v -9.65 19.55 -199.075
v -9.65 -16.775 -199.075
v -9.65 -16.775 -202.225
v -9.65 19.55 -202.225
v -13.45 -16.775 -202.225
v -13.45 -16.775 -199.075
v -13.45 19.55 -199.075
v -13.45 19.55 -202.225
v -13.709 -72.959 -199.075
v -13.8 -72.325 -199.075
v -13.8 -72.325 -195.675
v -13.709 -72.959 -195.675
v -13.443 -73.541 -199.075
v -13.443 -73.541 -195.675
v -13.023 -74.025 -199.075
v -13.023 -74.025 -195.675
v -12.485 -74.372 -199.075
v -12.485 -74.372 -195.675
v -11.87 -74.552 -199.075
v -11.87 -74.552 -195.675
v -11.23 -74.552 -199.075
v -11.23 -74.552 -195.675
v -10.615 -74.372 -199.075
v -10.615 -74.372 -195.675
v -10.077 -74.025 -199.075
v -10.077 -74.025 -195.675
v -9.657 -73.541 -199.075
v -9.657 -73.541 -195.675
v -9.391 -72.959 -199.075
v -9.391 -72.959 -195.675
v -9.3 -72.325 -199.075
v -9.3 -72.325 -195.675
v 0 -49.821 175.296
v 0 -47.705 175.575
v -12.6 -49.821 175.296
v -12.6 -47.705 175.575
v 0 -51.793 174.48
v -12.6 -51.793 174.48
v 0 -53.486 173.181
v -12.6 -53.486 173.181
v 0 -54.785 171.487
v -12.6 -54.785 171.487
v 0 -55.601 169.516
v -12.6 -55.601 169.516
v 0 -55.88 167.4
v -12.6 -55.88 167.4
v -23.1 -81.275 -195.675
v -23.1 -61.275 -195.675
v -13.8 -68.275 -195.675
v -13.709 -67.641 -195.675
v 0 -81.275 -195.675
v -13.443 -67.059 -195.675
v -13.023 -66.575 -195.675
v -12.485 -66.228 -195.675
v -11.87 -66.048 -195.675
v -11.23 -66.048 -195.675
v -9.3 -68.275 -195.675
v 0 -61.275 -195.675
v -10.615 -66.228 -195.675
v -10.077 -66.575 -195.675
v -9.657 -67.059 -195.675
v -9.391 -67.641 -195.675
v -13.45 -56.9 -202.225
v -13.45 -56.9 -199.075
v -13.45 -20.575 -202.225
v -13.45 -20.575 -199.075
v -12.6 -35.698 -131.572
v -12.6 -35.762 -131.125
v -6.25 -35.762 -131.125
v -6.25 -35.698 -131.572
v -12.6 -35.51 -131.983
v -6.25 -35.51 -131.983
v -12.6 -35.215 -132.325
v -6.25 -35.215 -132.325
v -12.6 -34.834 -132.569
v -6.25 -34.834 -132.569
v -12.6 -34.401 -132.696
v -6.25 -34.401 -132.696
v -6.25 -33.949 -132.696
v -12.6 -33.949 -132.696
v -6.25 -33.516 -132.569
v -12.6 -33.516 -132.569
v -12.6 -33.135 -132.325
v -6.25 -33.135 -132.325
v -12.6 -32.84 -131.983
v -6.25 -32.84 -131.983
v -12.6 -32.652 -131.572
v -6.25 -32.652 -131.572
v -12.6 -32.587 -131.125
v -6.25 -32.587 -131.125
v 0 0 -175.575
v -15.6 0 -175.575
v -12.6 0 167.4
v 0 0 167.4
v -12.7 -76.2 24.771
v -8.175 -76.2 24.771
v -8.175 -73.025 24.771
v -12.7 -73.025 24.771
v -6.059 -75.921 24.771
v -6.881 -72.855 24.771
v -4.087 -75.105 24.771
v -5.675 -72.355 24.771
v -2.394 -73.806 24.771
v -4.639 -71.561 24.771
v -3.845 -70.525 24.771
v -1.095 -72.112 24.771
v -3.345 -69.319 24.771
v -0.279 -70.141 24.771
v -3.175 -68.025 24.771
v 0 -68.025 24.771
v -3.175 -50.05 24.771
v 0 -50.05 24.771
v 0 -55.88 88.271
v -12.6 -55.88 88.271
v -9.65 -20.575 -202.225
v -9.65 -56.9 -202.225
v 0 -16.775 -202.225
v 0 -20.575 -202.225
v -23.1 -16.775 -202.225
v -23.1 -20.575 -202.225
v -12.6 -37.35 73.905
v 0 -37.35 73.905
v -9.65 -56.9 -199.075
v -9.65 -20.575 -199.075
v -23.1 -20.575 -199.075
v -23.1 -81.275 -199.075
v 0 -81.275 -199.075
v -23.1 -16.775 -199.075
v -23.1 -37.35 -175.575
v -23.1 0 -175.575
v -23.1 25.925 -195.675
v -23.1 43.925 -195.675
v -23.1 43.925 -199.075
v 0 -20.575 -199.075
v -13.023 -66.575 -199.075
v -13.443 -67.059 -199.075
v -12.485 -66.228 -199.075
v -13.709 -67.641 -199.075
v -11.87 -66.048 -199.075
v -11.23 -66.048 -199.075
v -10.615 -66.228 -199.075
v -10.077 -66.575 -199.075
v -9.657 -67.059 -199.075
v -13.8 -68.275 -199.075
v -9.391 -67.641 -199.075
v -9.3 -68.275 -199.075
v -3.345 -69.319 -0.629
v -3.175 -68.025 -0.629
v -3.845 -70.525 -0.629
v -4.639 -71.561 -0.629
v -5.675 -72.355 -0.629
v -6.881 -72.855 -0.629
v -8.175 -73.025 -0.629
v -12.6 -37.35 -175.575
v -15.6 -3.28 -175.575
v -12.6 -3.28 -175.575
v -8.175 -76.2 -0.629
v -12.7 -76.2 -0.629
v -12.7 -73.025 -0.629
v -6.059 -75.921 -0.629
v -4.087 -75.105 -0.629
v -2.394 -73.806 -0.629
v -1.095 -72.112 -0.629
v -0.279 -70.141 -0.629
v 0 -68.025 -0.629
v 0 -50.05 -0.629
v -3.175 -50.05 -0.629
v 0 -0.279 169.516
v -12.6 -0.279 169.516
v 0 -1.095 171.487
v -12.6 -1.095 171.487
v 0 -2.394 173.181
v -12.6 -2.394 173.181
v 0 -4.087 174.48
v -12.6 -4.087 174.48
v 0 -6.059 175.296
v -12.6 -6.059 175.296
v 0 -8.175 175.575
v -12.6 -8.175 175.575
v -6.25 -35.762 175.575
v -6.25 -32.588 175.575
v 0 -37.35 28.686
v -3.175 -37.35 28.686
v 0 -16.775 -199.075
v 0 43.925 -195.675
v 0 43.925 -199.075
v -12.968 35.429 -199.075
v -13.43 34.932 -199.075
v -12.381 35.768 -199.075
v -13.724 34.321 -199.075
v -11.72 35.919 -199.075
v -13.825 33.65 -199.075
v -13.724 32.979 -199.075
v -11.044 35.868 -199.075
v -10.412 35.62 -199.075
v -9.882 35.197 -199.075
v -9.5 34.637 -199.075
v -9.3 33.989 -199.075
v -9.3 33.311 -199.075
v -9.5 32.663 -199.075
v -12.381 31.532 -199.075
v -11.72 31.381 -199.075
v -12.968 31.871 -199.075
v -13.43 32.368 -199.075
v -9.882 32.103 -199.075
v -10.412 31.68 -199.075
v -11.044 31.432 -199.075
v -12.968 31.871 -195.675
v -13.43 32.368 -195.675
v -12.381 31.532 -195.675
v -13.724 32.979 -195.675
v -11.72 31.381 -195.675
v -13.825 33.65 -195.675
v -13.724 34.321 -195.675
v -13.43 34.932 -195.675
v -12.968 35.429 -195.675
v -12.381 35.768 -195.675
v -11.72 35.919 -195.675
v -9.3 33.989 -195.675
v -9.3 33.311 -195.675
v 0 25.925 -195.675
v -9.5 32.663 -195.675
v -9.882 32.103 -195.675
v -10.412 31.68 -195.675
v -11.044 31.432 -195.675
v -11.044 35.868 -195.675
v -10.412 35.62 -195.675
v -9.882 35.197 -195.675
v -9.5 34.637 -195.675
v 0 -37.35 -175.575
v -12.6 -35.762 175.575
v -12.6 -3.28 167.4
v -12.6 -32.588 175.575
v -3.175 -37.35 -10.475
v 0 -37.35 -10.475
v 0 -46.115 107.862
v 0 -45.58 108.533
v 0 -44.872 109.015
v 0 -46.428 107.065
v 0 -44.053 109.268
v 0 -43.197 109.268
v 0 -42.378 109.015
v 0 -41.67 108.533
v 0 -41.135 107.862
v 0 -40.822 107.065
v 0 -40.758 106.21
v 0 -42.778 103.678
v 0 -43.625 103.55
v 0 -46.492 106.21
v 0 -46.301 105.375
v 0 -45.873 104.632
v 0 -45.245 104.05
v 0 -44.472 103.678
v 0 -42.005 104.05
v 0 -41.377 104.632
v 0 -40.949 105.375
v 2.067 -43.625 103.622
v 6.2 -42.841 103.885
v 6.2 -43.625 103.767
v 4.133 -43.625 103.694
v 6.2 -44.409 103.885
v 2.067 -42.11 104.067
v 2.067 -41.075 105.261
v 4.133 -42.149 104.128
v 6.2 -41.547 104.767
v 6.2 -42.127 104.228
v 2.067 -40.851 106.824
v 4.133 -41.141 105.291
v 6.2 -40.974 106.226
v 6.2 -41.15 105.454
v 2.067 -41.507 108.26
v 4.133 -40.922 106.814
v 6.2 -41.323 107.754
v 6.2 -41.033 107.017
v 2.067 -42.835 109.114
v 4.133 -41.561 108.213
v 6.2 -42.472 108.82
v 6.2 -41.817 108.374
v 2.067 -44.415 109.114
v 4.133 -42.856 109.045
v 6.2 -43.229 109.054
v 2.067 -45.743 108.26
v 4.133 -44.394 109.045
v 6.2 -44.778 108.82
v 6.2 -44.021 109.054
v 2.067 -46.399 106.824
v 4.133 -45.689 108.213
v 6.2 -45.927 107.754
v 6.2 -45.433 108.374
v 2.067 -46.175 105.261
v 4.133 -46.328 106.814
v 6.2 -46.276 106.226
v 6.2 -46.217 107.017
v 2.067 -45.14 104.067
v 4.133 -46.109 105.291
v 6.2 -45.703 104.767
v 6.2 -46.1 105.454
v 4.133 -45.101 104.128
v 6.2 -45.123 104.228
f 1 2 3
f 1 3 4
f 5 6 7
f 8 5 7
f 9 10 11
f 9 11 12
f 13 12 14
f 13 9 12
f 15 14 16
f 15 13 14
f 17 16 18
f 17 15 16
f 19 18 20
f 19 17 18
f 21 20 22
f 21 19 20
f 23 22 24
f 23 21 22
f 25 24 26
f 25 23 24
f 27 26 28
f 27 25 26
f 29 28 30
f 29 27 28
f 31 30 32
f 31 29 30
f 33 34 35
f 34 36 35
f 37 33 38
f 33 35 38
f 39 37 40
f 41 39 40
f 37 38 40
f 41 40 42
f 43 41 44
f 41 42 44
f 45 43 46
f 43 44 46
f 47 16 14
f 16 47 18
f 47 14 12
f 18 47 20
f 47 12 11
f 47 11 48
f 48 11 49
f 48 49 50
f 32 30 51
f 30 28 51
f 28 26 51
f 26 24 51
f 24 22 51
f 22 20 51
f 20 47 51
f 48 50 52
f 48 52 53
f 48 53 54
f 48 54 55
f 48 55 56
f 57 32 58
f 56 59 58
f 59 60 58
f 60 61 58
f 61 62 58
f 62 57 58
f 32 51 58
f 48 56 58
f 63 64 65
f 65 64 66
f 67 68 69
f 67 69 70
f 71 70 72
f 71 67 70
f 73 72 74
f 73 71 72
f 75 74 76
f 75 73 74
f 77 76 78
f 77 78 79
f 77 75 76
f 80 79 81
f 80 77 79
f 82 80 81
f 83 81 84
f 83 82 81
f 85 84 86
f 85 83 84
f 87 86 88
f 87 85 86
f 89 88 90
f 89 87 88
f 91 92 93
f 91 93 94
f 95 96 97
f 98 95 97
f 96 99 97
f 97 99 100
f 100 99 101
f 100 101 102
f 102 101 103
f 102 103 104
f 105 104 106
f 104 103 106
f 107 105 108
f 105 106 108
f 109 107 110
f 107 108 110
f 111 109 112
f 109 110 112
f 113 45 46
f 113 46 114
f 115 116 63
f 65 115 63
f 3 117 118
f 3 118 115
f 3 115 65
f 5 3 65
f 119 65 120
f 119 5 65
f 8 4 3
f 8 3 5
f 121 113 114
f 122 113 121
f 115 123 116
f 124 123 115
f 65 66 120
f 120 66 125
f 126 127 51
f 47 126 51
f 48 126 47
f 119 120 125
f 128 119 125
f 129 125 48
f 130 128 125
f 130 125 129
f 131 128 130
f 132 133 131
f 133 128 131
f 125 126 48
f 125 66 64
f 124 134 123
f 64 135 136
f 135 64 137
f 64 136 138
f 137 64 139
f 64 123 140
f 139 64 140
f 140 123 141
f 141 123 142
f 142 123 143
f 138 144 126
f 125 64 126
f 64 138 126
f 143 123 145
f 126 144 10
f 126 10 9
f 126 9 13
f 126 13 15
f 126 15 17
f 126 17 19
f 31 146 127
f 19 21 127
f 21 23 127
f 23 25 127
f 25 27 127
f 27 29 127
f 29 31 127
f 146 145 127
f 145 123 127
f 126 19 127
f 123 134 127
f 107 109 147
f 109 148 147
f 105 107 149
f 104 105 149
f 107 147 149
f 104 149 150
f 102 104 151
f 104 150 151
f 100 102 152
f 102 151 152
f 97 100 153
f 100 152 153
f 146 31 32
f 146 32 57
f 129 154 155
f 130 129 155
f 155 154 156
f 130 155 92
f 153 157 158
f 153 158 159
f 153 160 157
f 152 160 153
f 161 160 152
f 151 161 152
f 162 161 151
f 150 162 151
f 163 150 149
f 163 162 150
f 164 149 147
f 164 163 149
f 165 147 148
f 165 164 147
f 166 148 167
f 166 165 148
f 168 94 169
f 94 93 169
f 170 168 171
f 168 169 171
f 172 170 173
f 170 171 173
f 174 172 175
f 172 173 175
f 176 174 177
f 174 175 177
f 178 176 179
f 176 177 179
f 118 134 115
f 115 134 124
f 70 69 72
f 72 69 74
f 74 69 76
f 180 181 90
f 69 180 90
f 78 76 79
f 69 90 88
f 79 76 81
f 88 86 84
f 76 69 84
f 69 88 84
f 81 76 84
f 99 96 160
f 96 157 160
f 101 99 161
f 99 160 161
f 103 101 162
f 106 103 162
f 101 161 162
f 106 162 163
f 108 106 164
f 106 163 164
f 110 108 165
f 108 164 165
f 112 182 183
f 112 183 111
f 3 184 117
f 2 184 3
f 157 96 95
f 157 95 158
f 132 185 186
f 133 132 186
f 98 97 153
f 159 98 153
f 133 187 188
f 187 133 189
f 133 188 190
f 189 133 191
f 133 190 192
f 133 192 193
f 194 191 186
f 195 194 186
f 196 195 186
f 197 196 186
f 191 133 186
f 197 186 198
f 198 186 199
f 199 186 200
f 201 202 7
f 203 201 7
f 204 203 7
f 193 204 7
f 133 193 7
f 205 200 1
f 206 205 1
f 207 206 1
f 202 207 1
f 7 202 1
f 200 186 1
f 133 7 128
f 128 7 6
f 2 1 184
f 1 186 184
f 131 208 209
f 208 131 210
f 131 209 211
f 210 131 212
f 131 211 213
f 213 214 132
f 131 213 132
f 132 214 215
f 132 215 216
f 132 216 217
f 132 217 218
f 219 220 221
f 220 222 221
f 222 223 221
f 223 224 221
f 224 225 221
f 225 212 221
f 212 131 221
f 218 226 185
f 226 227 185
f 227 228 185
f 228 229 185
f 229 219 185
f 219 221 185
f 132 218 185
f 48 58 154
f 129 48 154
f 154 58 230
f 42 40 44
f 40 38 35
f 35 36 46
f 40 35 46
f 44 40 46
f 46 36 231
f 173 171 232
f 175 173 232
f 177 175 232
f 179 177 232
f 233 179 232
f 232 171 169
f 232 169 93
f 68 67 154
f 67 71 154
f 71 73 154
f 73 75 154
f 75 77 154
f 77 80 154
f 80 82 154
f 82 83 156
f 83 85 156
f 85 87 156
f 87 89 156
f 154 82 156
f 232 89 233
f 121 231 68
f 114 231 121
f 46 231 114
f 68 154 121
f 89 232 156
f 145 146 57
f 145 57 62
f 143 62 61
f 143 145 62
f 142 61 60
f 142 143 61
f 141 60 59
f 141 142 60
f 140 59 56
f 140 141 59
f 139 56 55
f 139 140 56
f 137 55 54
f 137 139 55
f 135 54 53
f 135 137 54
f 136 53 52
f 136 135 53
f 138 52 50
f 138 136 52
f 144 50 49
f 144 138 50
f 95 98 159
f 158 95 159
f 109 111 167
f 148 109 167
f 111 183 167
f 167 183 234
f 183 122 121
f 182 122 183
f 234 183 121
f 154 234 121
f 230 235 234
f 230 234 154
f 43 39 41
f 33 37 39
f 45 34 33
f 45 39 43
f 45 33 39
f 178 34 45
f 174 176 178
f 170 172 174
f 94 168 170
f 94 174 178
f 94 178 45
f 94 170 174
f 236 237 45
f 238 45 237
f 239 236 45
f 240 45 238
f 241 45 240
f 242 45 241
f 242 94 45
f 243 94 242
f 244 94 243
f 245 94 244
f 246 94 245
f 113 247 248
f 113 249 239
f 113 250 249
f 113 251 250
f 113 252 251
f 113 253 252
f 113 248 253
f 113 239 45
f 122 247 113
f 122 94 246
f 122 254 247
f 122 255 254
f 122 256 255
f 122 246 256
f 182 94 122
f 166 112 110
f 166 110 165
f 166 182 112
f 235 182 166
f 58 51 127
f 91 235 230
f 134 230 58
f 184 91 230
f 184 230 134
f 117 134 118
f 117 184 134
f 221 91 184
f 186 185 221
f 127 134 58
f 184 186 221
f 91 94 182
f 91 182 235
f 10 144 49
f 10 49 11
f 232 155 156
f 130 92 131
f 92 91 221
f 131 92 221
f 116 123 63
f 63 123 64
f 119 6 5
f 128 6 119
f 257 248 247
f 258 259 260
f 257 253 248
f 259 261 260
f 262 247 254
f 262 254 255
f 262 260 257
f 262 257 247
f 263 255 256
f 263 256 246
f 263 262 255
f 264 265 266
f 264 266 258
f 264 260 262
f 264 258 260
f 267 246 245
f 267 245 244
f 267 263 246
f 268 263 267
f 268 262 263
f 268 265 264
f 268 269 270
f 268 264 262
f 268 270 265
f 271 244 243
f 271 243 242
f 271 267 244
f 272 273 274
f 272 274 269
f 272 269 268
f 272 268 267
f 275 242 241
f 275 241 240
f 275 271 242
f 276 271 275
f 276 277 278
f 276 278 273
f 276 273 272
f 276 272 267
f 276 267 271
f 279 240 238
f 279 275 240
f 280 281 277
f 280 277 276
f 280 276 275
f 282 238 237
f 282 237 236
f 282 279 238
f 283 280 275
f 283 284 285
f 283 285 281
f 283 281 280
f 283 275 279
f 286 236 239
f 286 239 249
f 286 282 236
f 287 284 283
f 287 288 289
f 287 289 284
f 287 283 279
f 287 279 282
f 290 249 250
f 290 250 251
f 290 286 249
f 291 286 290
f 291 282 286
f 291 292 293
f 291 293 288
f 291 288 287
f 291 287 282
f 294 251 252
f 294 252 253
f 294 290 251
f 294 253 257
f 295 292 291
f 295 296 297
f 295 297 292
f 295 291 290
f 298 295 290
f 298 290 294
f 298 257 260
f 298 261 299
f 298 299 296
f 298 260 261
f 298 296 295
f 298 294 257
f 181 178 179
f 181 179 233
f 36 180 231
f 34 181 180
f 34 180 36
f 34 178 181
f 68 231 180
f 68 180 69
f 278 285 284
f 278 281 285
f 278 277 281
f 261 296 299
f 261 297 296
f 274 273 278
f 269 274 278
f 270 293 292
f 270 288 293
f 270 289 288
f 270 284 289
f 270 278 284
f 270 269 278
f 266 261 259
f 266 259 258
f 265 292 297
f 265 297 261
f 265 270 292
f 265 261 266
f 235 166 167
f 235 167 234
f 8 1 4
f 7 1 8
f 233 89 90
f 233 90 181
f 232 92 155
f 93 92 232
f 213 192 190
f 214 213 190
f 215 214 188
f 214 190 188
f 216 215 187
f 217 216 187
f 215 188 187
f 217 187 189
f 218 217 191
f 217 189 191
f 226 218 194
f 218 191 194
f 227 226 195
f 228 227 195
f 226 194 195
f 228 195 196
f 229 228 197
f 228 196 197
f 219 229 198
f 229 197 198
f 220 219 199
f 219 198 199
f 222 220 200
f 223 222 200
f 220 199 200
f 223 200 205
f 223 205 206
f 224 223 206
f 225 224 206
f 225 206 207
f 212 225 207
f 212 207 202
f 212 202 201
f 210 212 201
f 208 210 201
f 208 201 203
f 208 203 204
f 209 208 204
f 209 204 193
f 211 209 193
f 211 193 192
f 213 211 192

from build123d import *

# Parameters (mm, degrees)
BOSS_EXTRUDE1_DEPTH = 12.6
BOSS_EXTRUDE2_DEPTH = 23.1
BOSS_EXTRUDE3_DEPTH = 3.175
SKETCH1_5_W         = 25.4
SKETCH1_5_H         = 3.175
BOSS_EXTRUDE4_DEPTH = 12.7
FILLET1_R           = 5
FILLET2_R           = 8.175
CUT_EXTRUDE1_DEPTH  = 6.35
CUT_EXTRUDE2_REACH  = 386.06
SKETCH3_R           = 2.275
SKETCH4_W           = 23.1
SKETCH4_H           = 3.8
SKETCH4_W_2         = 3.8
SKETCH4_H_2         = 76.45
EXTRUDE_THIN1_DEPTH = 3.15
SKETCH5_R           = 2.875
BOSS_EXTRUDE5_DEPTH = 6.2
BOSS_EXTRUDE5_TAPER = 2
BOSS_EXTRUDE6_DEPTH = 3.28


with BuildPart() as part:
    # Sketch1 → Boss-Extrude1 (new body)
    with BuildSketch(Plane(origin=(0, 0, 0), x_dir=(0, 0, -1), z_dir=(1, 0, 0))):
        Polygon((175.575, -37.35), (175.575, 0), (-175.575, 0), (-175.575, -55.88), (-88.271480231, -55.88), (-73.904922854, -37.35), (-28.686383268, -37.35), (10.475, -37.35), align=None)
    extrude(amount=-BOSS_EXTRUDE1_DEPTH)

    # Sketch1<3> → Boss-Extrude2 (add)
    with BuildSketch(Plane(origin=(0, 0, 0), x_dir=(0, 0, -1), z_dir=(1, 0, 0))):
        Polygon((199.075, -81.275), (199.075, 43.925), (195.675, 43.925), (195.675, 25.925), (175.575, 0), (175.575, -37.35), (195.675, -61.275), (195.675, -81.275), align=None)
    extrude(amount=-BOSS_EXTRUDE2_DEPTH)

    # Sketch1<4> → Boss-Extrude3 (add)
    with BuildSketch(Plane(origin=(0, 0, 0), x_dir=(0, 0, -1), z_dir=(1, 0, 0))):
        Polygon((0.628519769, -50.05), (10.475, -37.35), (-28.686383268, -37.35), (-24.771480231, -50.05), (-24.771480231, -73.025), (0.628519769, -73.025), align=None)
    extrude(amount=-BOSS_EXTRUDE3_DEPTH)

    # Sketch1<5> → Boss-Extrude4 (add)
    with BuildSketch(Plane(origin=(0, 0, 0), x_dir=(0, 0, -1), z_dir=(1, 0, 0))):
        with Locations((-12.071480231, -74.6125)):
            Rectangle(SKETCH1_5_W, SKETCH1_5_H)
    extrude(amount=-BOSS_EXTRUDE4_DEPTH)

    # Fillet1
    fillet1_edges = [part.edges().sort_by_distance(p)[0] for p in [
        (-3.175, -73.025, 12.071480231),
    ]]
    fillet(fillet1_edges, radius=FILLET1_R)

    # Fillet2
    fillet2_edges = [part.edges().sort_by_distance(p)[0] for p in [
        (-6.3, 0, 175.575),
        (-6.3, -55.88, 175.575),
        (0, -76.2, 12.071480231),
    ]]
    fillet(fillet2_edges, radius=FILLET2_R)

    # Sketch2 → Cut-Extrude1 (cut)
    with BuildSketch(Plane.ZY.offset(12.6)):
        with BuildLine():
            Line((-131.125, -32.5875), (222.402046917, -32.5875))
            ThreePointArc((222.402046917, -32.5875), (223.989546917, -34.175), (222.402046917, -35.7625))
            Line((222.402046917, -35.7625), (-131.125, -35.7625))
            ThreePointArc((-131.125, -35.7625), (-132.7125, -34.175), (-131.125, -32.5875))
        make_face()
    extrude(amount=-CUT_EXTRUDE1_DEPTH, mode=Mode.SUBTRACT)

    # Sketch3 → Cut-Extrude2 (cut, up to next)
    with BuildSketch(Plane(origin=(0, 0, -199.075), x_dir=(-1, 0, 0), z_dir=(0, 0, -1)), mode=Mode.PRIVATE) as cut_extrude2_sk1:
        with Locations((11.55, 33.65)):
            Circle(SKETCH3_R)
    cut_extrude2_tool1 = extrude(cut_extrude2_sk1.sketch, amount=-CUT_EXTRUDE2_REACH, mode=Mode.PRIVATE) & part.part
    # Sketch3 → Cut-Extrude2 (cut, up to next)
    with BuildSketch(Plane(origin=(0, 0, -199.075), x_dir=(-1, 0, 0), z_dir=(0, 0, -1)), mode=Mode.PRIVATE) as cut_extrude2_sk2:
        with BuildLine():
            Line((9.3, -72.325), (9.3, -68.275))
            ThreePointArc((9.3, -68.275), (11.55, -66.025), (13.8, -68.275))
            Line((13.8, -68.275), (13.8, -72.325))
            ThreePointArc((13.8, -72.325), (11.55, -74.575), (9.3, -72.325))
        make_face()
    cut_extrude2_tool2 = extrude(cut_extrude2_sk2.sketch, amount=-CUT_EXTRUDE2_REACH, mode=Mode.PRIVATE) & part.part
    add(cut_extrude2_tool1.solids().sort_by_distance((-11.55, 33.65, -199.075))[0], mode=Mode.SUBTRACT)
    add(cut_extrude2_tool2.solids().sort_by_distance((-11.55, -70.3, -199.075))[0], mode=Mode.SUBTRACT)

    # Sketch4 → Extrude-Thin1 (add)
    with BuildSketch(Plane(origin=(0, 0, -199.075), x_dir=(-1, 0, 0), z_dir=(0, 0, -1))):
        with Locations((11.55, -18.675)):
            Rectangle(SKETCH4_W, SKETCH4_H)
        with Locations((11.55, -18.675)):
            Rectangle(SKETCH4_W_2, SKETCH4_H_2)
    extrude(amount=EXTRUDE_THIN1_DEPTH)

    # Sketch5 → Boss-Extrude5 (add)
    with BuildSketch(Plane(origin=(0, 0, 0), x_dir=(0, 0, -1), z_dir=(1, 0, 0))):
        with Locations((-106.425, -43.625)):
            Circle(SKETCH5_R)
    extrude(amount=BOSS_EXTRUDE5_DEPTH, taper=BOSS_EXTRUDE5_TAPER)

    # Sketch6 → Boss-Extrude6 (add)
    with BuildSketch(Plane(origin=(0, 0, 0), x_dir=(1, 0, 0), z_dir=(0, 1, 0))):
        Polygon((-12.6, 175.575), (-15.6, 175.575), (-12.6, -167.4), align=None)
    extrude(amount=-BOSS_EXTRUDE6_DEPTH)


solid = part.part
